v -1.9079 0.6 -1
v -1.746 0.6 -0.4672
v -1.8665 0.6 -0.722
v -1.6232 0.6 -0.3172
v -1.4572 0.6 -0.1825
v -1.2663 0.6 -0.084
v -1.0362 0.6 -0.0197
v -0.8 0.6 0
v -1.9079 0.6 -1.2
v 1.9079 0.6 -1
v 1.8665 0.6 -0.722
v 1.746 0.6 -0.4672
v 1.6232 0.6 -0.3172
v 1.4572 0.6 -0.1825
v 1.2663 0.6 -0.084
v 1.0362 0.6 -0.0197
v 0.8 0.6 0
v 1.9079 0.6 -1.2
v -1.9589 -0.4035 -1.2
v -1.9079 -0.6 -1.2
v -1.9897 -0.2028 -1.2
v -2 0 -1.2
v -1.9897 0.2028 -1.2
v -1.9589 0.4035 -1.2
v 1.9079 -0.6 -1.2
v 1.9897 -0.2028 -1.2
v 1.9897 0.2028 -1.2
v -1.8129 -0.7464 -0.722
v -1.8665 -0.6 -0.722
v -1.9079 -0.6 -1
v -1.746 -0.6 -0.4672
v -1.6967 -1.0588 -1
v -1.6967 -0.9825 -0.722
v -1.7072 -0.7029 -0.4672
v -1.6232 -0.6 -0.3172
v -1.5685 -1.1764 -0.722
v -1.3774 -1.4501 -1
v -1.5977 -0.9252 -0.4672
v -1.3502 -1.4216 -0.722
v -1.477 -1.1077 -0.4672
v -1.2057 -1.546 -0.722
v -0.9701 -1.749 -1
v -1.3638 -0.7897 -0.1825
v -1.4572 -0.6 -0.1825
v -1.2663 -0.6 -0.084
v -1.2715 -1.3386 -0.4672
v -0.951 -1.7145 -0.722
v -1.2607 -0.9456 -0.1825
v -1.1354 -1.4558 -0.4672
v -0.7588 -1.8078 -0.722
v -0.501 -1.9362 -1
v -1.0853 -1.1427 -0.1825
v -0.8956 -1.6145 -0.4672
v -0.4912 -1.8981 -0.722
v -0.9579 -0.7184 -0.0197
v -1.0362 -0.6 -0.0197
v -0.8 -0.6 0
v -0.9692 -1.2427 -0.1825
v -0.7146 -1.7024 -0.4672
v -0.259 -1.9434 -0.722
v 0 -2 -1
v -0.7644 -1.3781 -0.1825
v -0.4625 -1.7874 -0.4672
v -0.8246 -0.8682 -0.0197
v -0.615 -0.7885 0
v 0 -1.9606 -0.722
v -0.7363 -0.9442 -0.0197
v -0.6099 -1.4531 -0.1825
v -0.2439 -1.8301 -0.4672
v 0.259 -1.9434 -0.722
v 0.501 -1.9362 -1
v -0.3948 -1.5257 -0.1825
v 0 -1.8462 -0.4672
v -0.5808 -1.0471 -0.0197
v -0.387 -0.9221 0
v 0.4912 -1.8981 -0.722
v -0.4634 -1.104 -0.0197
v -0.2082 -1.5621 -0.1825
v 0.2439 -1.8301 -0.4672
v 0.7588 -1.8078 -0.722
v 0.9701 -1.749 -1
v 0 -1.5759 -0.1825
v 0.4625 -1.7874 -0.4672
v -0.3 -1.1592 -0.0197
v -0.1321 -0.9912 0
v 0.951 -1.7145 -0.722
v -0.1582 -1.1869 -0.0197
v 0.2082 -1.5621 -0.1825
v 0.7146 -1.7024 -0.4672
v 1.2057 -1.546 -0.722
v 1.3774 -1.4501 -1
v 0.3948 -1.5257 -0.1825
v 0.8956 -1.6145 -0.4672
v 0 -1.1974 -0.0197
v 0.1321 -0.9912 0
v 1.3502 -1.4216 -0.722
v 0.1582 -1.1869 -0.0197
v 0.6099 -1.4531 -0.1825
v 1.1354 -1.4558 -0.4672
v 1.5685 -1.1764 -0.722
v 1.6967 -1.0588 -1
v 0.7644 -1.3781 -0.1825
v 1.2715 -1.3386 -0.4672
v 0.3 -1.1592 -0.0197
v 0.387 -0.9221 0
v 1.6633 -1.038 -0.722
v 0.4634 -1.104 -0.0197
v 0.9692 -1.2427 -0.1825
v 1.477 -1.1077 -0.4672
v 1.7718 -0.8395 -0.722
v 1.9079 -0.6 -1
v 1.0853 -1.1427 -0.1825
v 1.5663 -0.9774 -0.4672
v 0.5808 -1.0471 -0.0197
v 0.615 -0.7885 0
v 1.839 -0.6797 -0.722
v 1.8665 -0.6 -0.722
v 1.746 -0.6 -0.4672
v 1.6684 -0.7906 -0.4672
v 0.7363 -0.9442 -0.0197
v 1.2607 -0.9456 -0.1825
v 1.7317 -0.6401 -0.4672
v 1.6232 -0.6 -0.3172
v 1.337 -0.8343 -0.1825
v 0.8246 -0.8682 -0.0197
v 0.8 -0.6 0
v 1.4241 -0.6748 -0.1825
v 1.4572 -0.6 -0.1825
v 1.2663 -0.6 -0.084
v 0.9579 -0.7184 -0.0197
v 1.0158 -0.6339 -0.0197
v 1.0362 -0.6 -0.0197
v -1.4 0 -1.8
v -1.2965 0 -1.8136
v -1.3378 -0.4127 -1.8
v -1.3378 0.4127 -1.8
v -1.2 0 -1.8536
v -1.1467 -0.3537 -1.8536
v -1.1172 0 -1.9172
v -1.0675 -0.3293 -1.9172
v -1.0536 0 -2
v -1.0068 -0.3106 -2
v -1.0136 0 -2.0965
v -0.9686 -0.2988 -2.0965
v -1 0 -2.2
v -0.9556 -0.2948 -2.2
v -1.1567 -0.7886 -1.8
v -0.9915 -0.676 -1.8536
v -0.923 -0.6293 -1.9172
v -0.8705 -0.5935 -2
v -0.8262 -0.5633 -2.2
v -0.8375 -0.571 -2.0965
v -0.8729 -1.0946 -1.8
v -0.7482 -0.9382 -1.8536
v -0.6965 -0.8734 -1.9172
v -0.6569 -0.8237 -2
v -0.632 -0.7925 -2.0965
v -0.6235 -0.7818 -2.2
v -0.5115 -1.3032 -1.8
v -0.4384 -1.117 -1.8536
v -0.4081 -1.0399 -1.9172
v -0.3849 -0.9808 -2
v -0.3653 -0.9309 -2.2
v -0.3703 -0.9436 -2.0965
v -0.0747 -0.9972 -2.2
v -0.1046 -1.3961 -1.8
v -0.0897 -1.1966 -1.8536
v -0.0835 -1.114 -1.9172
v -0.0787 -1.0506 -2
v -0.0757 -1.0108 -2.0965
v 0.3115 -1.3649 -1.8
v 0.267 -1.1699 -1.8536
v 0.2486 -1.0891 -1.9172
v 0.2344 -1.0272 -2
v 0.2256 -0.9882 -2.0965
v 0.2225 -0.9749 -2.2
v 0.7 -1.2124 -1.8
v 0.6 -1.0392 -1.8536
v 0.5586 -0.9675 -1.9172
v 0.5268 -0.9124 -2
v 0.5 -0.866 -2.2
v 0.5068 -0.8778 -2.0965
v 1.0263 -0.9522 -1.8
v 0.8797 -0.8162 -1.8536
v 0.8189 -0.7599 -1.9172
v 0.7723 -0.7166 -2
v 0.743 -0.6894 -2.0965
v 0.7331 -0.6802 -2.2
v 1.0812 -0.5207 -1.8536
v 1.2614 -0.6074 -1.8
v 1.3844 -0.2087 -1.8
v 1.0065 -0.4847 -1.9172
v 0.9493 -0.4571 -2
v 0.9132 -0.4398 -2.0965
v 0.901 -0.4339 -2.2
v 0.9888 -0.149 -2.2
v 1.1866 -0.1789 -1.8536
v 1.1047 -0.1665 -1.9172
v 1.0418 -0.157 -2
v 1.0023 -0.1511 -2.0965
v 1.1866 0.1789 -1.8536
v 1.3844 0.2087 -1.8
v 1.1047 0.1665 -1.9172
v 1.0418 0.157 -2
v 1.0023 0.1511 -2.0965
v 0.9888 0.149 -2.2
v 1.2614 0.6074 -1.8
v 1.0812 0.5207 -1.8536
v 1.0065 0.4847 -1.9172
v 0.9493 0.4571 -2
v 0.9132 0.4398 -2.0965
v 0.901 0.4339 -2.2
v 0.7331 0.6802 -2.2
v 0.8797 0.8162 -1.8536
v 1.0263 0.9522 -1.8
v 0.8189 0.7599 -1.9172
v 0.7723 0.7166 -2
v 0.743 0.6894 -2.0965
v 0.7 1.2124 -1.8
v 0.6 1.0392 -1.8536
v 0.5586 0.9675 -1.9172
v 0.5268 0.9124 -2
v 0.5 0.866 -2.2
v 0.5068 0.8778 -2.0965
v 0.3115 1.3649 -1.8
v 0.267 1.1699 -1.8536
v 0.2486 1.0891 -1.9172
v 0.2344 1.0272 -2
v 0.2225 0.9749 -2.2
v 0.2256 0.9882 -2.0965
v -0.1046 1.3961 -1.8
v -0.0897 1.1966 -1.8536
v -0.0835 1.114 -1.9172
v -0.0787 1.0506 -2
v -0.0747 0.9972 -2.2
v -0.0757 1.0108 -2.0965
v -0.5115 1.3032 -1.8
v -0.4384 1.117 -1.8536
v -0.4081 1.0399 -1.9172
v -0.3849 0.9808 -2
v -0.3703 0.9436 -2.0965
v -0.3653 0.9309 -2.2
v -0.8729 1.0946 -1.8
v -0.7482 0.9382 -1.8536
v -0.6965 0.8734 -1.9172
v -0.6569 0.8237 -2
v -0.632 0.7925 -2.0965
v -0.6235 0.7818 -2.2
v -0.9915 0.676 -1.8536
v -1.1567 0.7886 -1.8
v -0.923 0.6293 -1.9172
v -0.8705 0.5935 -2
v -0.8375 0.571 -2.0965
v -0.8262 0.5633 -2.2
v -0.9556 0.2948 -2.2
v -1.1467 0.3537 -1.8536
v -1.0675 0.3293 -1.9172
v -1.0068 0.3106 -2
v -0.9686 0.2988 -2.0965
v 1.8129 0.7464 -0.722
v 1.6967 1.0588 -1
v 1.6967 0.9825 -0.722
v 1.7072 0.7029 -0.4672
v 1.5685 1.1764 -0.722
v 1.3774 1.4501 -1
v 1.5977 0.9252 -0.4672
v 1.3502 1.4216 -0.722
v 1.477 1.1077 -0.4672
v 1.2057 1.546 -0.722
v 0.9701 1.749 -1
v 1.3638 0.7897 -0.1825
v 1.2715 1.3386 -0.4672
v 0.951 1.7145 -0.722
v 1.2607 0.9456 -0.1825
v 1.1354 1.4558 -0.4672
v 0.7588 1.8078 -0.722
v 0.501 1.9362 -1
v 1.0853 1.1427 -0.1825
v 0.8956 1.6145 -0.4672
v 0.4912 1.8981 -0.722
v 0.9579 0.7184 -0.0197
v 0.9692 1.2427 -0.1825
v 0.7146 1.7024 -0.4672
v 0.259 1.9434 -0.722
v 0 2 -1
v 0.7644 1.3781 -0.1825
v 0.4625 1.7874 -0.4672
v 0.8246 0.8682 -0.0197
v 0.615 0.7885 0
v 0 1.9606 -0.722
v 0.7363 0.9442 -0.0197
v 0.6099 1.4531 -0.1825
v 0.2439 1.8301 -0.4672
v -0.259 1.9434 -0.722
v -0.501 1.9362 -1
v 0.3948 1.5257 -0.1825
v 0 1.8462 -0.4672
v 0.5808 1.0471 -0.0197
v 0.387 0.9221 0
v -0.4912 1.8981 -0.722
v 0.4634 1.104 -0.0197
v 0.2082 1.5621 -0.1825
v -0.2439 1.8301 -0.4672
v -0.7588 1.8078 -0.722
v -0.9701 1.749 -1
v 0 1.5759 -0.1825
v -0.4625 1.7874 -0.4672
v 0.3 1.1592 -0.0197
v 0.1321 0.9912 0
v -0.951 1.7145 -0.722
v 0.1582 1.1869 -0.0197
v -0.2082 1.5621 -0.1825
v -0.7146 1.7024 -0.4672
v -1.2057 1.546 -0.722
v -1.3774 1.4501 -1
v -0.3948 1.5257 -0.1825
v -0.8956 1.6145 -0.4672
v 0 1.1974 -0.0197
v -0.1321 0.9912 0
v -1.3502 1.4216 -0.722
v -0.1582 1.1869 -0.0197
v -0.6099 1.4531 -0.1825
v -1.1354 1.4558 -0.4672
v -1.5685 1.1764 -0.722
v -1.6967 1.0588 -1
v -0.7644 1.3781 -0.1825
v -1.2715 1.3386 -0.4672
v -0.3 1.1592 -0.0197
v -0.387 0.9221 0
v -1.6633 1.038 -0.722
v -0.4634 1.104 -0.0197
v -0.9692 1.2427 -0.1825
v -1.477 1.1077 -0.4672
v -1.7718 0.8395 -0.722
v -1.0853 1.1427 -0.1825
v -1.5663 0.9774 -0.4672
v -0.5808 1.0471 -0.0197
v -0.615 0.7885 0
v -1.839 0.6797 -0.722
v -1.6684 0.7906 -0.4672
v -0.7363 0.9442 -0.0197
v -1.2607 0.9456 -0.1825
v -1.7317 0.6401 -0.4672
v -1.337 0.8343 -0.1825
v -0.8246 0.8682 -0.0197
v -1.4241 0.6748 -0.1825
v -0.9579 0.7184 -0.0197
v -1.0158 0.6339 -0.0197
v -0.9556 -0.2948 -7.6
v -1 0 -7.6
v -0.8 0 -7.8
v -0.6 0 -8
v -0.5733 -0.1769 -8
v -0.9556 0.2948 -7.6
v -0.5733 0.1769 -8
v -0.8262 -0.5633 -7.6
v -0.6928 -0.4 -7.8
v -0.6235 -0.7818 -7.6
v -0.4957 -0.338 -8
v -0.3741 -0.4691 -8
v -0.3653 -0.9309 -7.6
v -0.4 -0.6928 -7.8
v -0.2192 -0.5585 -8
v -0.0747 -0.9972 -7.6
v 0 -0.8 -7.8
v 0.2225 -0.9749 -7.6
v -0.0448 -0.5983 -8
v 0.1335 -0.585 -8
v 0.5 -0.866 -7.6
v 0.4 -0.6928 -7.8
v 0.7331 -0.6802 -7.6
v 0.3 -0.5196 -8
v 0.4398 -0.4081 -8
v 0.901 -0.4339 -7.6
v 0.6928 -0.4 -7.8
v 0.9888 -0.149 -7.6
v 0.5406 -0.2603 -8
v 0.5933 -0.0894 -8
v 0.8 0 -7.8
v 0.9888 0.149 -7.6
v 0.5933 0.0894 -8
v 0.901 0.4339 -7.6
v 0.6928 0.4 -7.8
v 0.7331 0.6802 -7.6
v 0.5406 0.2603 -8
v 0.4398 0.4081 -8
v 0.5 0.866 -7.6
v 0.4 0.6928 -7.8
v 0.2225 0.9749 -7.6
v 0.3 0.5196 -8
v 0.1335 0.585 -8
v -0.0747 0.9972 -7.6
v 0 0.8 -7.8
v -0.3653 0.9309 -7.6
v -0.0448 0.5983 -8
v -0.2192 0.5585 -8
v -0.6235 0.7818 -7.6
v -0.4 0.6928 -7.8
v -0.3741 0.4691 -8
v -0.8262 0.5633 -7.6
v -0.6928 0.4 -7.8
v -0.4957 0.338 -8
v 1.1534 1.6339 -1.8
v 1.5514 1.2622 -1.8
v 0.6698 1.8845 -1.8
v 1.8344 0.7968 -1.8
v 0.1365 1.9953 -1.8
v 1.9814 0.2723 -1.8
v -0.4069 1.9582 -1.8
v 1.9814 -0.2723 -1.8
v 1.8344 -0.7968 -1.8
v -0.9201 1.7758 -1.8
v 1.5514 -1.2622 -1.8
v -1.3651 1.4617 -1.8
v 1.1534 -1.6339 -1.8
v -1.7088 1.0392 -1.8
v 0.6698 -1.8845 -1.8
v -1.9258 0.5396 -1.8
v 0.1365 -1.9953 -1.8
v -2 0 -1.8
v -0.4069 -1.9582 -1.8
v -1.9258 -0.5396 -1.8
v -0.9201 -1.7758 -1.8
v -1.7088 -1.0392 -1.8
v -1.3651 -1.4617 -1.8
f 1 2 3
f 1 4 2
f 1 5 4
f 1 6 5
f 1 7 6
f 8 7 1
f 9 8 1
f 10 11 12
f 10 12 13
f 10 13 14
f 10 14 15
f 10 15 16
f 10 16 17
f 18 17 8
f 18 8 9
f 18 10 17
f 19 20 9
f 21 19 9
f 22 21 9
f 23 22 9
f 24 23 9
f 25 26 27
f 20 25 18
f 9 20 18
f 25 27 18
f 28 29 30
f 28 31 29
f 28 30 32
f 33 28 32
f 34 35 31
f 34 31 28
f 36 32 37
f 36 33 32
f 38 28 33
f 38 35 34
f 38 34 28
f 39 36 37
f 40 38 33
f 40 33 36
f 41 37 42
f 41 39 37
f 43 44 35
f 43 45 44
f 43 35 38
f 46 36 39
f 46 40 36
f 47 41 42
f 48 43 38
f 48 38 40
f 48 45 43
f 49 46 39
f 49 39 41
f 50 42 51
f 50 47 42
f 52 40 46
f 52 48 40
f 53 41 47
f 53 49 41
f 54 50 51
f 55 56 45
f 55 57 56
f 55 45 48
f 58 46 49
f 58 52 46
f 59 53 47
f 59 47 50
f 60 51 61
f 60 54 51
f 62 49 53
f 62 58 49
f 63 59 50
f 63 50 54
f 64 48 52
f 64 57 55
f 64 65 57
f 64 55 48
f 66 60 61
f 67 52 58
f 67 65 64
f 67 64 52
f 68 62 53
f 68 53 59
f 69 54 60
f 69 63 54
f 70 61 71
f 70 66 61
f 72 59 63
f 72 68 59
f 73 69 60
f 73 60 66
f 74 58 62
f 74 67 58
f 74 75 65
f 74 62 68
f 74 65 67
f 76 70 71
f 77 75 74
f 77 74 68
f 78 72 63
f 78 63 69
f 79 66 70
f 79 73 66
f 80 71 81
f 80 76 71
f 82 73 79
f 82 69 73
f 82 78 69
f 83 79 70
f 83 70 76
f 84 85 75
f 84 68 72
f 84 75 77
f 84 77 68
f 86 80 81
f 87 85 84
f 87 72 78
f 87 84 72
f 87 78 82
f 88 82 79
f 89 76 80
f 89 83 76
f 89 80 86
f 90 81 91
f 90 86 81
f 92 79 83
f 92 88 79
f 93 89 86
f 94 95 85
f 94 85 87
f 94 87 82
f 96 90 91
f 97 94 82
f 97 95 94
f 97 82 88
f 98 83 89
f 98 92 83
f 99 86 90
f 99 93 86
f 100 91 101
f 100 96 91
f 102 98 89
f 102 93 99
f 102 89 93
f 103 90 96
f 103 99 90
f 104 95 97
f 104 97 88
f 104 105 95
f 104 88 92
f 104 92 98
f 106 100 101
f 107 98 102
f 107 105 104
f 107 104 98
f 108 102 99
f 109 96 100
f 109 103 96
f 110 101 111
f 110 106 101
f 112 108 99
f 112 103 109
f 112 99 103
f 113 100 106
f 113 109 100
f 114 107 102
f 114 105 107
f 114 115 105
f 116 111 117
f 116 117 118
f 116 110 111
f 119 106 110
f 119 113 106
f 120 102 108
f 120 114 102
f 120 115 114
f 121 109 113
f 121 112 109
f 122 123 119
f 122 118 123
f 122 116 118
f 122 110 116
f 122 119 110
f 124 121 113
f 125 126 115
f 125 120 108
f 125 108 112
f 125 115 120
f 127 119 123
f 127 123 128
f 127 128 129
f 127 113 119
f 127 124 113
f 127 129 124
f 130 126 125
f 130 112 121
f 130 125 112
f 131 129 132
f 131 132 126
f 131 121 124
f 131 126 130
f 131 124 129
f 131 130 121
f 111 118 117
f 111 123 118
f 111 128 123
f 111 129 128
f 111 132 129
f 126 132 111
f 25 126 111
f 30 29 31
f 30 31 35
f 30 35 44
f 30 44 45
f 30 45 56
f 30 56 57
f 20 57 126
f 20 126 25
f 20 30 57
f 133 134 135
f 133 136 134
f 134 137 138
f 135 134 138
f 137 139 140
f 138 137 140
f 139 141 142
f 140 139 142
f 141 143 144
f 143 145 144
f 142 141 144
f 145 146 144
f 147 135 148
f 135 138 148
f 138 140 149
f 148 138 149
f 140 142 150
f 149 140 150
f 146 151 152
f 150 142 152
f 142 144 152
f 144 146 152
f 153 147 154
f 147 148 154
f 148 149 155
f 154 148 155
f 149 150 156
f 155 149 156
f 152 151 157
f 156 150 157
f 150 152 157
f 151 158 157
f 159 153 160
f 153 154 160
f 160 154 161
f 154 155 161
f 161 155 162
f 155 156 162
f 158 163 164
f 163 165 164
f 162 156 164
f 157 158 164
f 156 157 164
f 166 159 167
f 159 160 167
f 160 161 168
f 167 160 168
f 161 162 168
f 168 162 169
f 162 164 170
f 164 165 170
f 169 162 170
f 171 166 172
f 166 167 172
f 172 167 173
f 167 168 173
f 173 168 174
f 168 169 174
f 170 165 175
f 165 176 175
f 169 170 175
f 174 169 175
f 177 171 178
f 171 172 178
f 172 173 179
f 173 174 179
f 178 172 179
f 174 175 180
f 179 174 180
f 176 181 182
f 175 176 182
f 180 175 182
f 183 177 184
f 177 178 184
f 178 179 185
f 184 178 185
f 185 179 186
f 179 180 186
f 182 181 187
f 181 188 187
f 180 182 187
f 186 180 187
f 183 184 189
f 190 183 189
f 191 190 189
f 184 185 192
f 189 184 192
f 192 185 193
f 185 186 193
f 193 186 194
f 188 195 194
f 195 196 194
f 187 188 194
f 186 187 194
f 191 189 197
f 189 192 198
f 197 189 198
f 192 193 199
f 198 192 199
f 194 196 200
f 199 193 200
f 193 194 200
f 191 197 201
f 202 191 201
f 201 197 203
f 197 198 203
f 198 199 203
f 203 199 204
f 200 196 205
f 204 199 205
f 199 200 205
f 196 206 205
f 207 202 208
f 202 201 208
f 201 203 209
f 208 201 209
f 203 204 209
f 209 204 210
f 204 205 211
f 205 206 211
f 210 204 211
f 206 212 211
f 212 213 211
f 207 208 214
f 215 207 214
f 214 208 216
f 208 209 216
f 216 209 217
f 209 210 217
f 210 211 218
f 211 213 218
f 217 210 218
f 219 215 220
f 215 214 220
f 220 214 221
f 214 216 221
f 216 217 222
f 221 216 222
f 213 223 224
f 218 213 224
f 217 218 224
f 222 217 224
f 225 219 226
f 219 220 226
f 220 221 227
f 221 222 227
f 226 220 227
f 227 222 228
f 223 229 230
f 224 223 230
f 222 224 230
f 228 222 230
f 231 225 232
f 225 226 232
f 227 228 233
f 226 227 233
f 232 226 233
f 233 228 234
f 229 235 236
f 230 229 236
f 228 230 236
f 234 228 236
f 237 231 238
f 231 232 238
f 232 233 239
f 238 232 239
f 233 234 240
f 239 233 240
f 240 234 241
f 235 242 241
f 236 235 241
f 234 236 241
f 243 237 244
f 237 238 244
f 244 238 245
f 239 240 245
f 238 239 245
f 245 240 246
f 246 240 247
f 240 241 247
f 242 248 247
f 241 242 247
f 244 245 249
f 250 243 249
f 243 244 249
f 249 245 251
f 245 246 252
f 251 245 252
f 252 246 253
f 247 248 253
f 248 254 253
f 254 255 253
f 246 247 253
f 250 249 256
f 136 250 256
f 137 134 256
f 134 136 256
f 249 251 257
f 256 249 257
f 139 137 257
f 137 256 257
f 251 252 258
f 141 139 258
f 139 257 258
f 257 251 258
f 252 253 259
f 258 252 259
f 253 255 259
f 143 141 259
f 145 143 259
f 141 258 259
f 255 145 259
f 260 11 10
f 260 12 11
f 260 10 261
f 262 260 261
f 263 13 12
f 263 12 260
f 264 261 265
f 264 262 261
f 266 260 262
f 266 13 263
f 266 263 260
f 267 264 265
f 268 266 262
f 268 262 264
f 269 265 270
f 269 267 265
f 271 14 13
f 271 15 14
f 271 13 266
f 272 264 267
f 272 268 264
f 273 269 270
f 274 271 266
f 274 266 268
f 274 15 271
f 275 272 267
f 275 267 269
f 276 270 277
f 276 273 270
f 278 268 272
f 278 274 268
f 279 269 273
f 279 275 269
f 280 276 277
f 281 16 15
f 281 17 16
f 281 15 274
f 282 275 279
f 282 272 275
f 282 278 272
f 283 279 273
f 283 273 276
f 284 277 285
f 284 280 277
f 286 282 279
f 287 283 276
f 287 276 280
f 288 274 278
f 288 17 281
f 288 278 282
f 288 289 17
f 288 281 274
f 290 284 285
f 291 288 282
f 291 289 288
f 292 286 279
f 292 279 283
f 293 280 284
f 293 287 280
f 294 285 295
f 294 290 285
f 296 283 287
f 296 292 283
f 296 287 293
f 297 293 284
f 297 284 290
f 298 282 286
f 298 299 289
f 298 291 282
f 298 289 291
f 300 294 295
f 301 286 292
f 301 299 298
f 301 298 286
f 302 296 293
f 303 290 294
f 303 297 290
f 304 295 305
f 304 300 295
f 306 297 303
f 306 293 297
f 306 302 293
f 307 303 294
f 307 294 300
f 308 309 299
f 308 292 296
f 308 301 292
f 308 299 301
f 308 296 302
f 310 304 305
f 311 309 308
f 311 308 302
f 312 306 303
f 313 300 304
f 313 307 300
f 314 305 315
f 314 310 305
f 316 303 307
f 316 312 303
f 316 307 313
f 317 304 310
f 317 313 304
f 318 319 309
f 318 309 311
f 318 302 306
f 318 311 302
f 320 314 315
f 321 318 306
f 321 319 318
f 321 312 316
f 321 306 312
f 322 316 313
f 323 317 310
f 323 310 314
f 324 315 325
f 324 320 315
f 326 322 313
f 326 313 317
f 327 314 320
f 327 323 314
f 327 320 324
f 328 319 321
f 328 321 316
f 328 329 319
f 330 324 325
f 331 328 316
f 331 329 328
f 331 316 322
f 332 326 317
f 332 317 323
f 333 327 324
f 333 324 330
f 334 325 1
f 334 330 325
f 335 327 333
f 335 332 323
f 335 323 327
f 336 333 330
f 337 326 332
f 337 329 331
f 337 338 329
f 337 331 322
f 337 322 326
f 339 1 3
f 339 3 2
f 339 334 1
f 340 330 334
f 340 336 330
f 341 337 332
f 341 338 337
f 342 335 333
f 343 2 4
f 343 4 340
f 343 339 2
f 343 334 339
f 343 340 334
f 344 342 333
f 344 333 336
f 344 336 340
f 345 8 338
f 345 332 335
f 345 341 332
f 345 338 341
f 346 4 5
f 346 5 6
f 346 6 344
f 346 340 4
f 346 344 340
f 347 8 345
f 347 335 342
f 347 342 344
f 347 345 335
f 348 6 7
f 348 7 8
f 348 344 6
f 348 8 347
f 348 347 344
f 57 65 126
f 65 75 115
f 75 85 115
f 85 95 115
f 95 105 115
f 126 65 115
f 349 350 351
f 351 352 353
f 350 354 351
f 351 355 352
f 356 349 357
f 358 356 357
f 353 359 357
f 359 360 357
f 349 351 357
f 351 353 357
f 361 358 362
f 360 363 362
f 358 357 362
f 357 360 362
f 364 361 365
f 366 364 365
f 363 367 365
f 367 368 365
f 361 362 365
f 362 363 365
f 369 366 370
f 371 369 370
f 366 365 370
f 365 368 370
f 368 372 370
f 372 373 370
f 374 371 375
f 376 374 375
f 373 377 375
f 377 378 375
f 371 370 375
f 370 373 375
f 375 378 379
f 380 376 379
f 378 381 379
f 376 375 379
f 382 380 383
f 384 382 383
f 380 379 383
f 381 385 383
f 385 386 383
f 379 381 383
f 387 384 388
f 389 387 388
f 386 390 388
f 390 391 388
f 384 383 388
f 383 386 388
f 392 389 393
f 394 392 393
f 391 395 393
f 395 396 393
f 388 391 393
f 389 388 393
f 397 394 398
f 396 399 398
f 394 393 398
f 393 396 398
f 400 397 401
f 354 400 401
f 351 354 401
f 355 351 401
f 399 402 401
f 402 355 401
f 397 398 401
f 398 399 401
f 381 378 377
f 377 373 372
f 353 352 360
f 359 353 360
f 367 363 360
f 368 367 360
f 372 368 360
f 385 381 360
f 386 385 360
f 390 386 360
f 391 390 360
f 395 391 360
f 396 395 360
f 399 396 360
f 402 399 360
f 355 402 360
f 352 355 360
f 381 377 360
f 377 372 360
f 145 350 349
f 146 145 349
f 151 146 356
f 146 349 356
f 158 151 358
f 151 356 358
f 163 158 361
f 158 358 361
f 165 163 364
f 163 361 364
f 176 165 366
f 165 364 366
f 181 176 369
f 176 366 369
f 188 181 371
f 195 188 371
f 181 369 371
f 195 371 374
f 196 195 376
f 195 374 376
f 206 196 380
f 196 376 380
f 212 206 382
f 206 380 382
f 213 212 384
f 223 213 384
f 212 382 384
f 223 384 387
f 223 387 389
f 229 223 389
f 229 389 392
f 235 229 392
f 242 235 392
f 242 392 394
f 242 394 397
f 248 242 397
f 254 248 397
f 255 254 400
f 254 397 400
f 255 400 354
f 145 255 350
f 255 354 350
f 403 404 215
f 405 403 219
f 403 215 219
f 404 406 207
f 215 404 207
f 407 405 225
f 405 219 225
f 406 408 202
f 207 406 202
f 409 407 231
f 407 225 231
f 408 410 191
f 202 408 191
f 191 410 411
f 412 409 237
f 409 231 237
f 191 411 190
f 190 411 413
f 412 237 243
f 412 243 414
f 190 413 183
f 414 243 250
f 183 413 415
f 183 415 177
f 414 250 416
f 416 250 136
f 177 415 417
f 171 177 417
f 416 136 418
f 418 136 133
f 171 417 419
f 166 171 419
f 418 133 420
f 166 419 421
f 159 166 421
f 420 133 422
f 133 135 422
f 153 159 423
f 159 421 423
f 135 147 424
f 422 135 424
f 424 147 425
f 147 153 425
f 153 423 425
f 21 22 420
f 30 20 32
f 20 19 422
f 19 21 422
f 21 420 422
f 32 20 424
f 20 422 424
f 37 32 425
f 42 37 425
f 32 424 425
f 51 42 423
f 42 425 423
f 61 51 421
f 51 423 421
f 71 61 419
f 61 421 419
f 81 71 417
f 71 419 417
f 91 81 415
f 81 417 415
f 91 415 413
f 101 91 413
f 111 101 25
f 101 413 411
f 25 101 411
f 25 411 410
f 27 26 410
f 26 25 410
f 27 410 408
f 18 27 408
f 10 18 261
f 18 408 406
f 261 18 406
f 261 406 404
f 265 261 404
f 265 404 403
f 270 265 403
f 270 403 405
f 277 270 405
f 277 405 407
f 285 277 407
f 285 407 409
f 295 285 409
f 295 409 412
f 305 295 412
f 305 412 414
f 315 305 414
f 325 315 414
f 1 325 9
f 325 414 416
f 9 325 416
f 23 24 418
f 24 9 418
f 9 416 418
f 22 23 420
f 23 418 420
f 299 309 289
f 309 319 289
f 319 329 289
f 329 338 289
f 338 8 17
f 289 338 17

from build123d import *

# Parameters (mm, degrees)
SKETCH_2_W               = 1.2
SKETCH_2_H               = 1.2
CUT_EXTRUDE_1_DEPTH      = 3
CUT_EXTRUDE_1_DEPTH_BACK = 3
CHAMFER_1_SIZE           = 0.4
FILLET_1_R               = 1
FILLET_2_R               = 0.4


with BuildPart() as part:
    # Эскиз1 → Повернуть1 (revolve)
    with BuildSketch(Plane(origin=(0, 0, 0), x_dir=(1, 0, 0), z_dir=(0, 1, 0))):
        Polygon((0, 0), (-2, 0), (-2, 1.8), (-1, 1.8), (-1, 8), (0, 8), align=None)
    revolve(axis=Axis((0, 0, -8), (0, 0, 1)))

    # Эскиз2 → Вырез-Вытянуть1 (cut, two sides)
    with BuildSketch(Plane(origin=(0, 0, 0), x_dir=(0, 0, -1), z_dir=(1, 0, 0))) as cut_extrude_1_sk:
        with Locations((0.6, 0)):
            Rectangle(SKETCH_2_W, SKETCH_2_H)
    extrude(amount=CUT_EXTRUDE_1_DEPTH, mode=Mode.SUBTRACT)
    extrude(cut_extrude_1_sk.sketch, amount=-CUT_EXTRUDE_1_DEPTH_BACK, mode=Mode.SUBTRACT)

    # Фаска1
    chamfer_1_edges = [part.edges().sort_by_distance(p)[0] for p in [
        (1, 0, -8),
    ]]
    chamfer(chamfer_1_edges, length=CHAMFER_1_SIZE)

    # Скругление1
    fillet_1_edges = [part.edges().sort_by_distance(p)[0] for p in [
        (0, 2, 0),
        (0, -2, 0),
    ]]
    fillet(fillet_1_edges, radius=FILLET_1_R)

    # Скругление2
    fillet_2_edges = [part.edges().sort_by_distance(p)[0] for p in [
        (1, 0, -1.8),
    ]]
    fillet(fillet_2_edges, radius=FILLET_2_R)


solid = part.part
